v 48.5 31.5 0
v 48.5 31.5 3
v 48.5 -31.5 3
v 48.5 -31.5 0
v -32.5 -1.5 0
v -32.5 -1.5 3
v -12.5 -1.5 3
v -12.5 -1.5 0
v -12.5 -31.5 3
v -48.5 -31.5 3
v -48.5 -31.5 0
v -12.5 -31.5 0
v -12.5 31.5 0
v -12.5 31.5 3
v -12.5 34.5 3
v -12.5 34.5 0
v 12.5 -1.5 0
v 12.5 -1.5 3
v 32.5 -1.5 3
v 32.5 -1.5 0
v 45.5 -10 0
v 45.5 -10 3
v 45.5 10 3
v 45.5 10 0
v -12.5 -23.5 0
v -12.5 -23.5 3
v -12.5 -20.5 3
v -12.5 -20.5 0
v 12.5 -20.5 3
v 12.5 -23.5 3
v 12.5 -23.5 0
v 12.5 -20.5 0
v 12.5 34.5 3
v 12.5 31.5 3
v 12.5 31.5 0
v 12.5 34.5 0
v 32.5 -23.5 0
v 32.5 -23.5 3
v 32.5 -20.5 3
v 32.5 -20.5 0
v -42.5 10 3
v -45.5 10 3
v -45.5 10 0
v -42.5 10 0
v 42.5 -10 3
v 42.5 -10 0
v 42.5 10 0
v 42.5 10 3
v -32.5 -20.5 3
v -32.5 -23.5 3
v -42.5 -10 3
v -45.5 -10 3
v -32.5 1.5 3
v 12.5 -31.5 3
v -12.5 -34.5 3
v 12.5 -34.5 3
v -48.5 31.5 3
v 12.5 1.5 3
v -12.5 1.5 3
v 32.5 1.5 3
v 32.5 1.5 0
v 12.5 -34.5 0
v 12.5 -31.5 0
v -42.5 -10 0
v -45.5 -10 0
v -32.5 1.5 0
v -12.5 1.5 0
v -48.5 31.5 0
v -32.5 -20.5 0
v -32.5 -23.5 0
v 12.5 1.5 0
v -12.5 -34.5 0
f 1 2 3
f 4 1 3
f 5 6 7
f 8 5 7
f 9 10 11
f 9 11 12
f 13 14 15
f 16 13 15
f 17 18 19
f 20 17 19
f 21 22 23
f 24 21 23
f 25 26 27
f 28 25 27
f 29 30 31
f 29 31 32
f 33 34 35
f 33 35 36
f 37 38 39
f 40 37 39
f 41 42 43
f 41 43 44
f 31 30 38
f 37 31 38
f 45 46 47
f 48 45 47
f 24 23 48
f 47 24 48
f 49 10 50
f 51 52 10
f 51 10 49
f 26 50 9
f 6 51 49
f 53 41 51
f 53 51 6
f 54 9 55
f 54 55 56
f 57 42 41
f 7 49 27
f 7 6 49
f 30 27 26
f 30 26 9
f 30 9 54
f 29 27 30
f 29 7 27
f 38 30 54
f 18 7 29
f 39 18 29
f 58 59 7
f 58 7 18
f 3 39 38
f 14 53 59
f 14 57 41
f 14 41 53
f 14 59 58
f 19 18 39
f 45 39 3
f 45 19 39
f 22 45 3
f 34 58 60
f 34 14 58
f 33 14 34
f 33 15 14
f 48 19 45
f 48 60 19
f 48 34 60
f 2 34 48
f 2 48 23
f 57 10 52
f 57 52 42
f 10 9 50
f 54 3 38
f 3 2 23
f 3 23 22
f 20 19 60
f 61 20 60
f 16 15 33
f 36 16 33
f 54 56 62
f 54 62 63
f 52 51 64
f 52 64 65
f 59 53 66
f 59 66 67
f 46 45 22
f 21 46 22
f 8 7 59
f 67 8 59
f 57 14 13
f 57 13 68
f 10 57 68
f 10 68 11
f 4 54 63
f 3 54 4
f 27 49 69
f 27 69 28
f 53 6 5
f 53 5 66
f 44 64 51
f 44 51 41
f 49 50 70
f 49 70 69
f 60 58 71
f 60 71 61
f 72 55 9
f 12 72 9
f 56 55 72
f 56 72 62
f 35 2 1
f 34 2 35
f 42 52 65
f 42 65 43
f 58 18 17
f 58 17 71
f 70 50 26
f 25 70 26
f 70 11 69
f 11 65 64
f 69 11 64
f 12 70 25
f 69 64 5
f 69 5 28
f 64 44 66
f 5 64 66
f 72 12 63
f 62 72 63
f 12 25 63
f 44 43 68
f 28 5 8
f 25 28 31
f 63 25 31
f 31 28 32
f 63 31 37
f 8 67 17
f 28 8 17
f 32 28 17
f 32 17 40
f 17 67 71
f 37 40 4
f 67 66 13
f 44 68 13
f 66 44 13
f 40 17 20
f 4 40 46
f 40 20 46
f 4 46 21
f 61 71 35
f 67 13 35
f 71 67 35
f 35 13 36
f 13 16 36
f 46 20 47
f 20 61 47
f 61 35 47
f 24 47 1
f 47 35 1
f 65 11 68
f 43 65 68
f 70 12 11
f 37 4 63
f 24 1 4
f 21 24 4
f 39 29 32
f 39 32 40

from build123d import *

# Parameters (mm, degrees)
SKETCH1_W           = 85
SKETCH1_H           = 63
BOSS_EXTRUDE1_DEPTH = 3
SKETCH2_W           = 20
SKETCH2_H           = 3
CUT_EXTRUDE1_DEPTH  = 53.985847167
BOSS_EXTRUDE2_DEPTH = 3
SKETCH4_W           = 25
SKETCH4_H           = 3
BOSS_EXTRUDE3_DEPTH = 3


with BuildPart() as part:
    # Sketch1 → Boss-Extrude1 (new body)
    with BuildSketch(Plane.XY):
        Rectangle(SKETCH1_W, SKETCH1_H)
    extrude(amount=BOSS_EXTRUDE1_DEPTH)

    # Sketch2 → Cut-Extrude1 (cut, through all)
    with BuildSketch(Plane.XY.offset(3)):
        with Locations((-22.5, 0)):
            Rectangle(SKETCH2_W, SKETCH2_H)
        with Locations((22.5, 0)):
            Rectangle(SKETCH2_W, SKETCH2_H)
        with Locations((-22.5, -22)):
            Rectangle(SKETCH2_W, SKETCH2_H)
        with Locations((22.5, -22)):
            Rectangle(SKETCH2_W, SKETCH2_H)
    extrude(amount=-CUT_EXTRUDE1_DEPTH, mode=Mode.SUBTRACT)

    # Sketch3 → Boss-Extrude2 (add)
    with BuildSketch(Plane.XY.offset(3)):
        Polygon((-42.5, 31.5), (-48.5, 31.5), (-48.5, -31.5), (-42.5, -31.5), (-42.5, -10), (-45.5, -10), (-45.5, 10), (-42.5, 10), align=None)
        Polygon((42.5, 10), (42.5, 31.5), (48.5, 31.5), (48.5, -31.5), (42.5, -31.5), (42.5, -10), (45.5, -10), (45.5, 10), align=None)
    extrude(amount=-BOSS_EXTRUDE2_DEPTH)

    # Sketch4 → Boss-Extrude3 (add)
    with BuildSketch(Plane.XY.offset(3)):
        with Locations((0, 33)):
            Rectangle(SKETCH4_W, SKETCH4_H)
        with Locations((0, -33)):
            Rectangle(SKETCH4_W, SKETCH4_H)
    extrude(amount=-BOSS_EXTRUDE3_DEPTH)


solid = part.part
